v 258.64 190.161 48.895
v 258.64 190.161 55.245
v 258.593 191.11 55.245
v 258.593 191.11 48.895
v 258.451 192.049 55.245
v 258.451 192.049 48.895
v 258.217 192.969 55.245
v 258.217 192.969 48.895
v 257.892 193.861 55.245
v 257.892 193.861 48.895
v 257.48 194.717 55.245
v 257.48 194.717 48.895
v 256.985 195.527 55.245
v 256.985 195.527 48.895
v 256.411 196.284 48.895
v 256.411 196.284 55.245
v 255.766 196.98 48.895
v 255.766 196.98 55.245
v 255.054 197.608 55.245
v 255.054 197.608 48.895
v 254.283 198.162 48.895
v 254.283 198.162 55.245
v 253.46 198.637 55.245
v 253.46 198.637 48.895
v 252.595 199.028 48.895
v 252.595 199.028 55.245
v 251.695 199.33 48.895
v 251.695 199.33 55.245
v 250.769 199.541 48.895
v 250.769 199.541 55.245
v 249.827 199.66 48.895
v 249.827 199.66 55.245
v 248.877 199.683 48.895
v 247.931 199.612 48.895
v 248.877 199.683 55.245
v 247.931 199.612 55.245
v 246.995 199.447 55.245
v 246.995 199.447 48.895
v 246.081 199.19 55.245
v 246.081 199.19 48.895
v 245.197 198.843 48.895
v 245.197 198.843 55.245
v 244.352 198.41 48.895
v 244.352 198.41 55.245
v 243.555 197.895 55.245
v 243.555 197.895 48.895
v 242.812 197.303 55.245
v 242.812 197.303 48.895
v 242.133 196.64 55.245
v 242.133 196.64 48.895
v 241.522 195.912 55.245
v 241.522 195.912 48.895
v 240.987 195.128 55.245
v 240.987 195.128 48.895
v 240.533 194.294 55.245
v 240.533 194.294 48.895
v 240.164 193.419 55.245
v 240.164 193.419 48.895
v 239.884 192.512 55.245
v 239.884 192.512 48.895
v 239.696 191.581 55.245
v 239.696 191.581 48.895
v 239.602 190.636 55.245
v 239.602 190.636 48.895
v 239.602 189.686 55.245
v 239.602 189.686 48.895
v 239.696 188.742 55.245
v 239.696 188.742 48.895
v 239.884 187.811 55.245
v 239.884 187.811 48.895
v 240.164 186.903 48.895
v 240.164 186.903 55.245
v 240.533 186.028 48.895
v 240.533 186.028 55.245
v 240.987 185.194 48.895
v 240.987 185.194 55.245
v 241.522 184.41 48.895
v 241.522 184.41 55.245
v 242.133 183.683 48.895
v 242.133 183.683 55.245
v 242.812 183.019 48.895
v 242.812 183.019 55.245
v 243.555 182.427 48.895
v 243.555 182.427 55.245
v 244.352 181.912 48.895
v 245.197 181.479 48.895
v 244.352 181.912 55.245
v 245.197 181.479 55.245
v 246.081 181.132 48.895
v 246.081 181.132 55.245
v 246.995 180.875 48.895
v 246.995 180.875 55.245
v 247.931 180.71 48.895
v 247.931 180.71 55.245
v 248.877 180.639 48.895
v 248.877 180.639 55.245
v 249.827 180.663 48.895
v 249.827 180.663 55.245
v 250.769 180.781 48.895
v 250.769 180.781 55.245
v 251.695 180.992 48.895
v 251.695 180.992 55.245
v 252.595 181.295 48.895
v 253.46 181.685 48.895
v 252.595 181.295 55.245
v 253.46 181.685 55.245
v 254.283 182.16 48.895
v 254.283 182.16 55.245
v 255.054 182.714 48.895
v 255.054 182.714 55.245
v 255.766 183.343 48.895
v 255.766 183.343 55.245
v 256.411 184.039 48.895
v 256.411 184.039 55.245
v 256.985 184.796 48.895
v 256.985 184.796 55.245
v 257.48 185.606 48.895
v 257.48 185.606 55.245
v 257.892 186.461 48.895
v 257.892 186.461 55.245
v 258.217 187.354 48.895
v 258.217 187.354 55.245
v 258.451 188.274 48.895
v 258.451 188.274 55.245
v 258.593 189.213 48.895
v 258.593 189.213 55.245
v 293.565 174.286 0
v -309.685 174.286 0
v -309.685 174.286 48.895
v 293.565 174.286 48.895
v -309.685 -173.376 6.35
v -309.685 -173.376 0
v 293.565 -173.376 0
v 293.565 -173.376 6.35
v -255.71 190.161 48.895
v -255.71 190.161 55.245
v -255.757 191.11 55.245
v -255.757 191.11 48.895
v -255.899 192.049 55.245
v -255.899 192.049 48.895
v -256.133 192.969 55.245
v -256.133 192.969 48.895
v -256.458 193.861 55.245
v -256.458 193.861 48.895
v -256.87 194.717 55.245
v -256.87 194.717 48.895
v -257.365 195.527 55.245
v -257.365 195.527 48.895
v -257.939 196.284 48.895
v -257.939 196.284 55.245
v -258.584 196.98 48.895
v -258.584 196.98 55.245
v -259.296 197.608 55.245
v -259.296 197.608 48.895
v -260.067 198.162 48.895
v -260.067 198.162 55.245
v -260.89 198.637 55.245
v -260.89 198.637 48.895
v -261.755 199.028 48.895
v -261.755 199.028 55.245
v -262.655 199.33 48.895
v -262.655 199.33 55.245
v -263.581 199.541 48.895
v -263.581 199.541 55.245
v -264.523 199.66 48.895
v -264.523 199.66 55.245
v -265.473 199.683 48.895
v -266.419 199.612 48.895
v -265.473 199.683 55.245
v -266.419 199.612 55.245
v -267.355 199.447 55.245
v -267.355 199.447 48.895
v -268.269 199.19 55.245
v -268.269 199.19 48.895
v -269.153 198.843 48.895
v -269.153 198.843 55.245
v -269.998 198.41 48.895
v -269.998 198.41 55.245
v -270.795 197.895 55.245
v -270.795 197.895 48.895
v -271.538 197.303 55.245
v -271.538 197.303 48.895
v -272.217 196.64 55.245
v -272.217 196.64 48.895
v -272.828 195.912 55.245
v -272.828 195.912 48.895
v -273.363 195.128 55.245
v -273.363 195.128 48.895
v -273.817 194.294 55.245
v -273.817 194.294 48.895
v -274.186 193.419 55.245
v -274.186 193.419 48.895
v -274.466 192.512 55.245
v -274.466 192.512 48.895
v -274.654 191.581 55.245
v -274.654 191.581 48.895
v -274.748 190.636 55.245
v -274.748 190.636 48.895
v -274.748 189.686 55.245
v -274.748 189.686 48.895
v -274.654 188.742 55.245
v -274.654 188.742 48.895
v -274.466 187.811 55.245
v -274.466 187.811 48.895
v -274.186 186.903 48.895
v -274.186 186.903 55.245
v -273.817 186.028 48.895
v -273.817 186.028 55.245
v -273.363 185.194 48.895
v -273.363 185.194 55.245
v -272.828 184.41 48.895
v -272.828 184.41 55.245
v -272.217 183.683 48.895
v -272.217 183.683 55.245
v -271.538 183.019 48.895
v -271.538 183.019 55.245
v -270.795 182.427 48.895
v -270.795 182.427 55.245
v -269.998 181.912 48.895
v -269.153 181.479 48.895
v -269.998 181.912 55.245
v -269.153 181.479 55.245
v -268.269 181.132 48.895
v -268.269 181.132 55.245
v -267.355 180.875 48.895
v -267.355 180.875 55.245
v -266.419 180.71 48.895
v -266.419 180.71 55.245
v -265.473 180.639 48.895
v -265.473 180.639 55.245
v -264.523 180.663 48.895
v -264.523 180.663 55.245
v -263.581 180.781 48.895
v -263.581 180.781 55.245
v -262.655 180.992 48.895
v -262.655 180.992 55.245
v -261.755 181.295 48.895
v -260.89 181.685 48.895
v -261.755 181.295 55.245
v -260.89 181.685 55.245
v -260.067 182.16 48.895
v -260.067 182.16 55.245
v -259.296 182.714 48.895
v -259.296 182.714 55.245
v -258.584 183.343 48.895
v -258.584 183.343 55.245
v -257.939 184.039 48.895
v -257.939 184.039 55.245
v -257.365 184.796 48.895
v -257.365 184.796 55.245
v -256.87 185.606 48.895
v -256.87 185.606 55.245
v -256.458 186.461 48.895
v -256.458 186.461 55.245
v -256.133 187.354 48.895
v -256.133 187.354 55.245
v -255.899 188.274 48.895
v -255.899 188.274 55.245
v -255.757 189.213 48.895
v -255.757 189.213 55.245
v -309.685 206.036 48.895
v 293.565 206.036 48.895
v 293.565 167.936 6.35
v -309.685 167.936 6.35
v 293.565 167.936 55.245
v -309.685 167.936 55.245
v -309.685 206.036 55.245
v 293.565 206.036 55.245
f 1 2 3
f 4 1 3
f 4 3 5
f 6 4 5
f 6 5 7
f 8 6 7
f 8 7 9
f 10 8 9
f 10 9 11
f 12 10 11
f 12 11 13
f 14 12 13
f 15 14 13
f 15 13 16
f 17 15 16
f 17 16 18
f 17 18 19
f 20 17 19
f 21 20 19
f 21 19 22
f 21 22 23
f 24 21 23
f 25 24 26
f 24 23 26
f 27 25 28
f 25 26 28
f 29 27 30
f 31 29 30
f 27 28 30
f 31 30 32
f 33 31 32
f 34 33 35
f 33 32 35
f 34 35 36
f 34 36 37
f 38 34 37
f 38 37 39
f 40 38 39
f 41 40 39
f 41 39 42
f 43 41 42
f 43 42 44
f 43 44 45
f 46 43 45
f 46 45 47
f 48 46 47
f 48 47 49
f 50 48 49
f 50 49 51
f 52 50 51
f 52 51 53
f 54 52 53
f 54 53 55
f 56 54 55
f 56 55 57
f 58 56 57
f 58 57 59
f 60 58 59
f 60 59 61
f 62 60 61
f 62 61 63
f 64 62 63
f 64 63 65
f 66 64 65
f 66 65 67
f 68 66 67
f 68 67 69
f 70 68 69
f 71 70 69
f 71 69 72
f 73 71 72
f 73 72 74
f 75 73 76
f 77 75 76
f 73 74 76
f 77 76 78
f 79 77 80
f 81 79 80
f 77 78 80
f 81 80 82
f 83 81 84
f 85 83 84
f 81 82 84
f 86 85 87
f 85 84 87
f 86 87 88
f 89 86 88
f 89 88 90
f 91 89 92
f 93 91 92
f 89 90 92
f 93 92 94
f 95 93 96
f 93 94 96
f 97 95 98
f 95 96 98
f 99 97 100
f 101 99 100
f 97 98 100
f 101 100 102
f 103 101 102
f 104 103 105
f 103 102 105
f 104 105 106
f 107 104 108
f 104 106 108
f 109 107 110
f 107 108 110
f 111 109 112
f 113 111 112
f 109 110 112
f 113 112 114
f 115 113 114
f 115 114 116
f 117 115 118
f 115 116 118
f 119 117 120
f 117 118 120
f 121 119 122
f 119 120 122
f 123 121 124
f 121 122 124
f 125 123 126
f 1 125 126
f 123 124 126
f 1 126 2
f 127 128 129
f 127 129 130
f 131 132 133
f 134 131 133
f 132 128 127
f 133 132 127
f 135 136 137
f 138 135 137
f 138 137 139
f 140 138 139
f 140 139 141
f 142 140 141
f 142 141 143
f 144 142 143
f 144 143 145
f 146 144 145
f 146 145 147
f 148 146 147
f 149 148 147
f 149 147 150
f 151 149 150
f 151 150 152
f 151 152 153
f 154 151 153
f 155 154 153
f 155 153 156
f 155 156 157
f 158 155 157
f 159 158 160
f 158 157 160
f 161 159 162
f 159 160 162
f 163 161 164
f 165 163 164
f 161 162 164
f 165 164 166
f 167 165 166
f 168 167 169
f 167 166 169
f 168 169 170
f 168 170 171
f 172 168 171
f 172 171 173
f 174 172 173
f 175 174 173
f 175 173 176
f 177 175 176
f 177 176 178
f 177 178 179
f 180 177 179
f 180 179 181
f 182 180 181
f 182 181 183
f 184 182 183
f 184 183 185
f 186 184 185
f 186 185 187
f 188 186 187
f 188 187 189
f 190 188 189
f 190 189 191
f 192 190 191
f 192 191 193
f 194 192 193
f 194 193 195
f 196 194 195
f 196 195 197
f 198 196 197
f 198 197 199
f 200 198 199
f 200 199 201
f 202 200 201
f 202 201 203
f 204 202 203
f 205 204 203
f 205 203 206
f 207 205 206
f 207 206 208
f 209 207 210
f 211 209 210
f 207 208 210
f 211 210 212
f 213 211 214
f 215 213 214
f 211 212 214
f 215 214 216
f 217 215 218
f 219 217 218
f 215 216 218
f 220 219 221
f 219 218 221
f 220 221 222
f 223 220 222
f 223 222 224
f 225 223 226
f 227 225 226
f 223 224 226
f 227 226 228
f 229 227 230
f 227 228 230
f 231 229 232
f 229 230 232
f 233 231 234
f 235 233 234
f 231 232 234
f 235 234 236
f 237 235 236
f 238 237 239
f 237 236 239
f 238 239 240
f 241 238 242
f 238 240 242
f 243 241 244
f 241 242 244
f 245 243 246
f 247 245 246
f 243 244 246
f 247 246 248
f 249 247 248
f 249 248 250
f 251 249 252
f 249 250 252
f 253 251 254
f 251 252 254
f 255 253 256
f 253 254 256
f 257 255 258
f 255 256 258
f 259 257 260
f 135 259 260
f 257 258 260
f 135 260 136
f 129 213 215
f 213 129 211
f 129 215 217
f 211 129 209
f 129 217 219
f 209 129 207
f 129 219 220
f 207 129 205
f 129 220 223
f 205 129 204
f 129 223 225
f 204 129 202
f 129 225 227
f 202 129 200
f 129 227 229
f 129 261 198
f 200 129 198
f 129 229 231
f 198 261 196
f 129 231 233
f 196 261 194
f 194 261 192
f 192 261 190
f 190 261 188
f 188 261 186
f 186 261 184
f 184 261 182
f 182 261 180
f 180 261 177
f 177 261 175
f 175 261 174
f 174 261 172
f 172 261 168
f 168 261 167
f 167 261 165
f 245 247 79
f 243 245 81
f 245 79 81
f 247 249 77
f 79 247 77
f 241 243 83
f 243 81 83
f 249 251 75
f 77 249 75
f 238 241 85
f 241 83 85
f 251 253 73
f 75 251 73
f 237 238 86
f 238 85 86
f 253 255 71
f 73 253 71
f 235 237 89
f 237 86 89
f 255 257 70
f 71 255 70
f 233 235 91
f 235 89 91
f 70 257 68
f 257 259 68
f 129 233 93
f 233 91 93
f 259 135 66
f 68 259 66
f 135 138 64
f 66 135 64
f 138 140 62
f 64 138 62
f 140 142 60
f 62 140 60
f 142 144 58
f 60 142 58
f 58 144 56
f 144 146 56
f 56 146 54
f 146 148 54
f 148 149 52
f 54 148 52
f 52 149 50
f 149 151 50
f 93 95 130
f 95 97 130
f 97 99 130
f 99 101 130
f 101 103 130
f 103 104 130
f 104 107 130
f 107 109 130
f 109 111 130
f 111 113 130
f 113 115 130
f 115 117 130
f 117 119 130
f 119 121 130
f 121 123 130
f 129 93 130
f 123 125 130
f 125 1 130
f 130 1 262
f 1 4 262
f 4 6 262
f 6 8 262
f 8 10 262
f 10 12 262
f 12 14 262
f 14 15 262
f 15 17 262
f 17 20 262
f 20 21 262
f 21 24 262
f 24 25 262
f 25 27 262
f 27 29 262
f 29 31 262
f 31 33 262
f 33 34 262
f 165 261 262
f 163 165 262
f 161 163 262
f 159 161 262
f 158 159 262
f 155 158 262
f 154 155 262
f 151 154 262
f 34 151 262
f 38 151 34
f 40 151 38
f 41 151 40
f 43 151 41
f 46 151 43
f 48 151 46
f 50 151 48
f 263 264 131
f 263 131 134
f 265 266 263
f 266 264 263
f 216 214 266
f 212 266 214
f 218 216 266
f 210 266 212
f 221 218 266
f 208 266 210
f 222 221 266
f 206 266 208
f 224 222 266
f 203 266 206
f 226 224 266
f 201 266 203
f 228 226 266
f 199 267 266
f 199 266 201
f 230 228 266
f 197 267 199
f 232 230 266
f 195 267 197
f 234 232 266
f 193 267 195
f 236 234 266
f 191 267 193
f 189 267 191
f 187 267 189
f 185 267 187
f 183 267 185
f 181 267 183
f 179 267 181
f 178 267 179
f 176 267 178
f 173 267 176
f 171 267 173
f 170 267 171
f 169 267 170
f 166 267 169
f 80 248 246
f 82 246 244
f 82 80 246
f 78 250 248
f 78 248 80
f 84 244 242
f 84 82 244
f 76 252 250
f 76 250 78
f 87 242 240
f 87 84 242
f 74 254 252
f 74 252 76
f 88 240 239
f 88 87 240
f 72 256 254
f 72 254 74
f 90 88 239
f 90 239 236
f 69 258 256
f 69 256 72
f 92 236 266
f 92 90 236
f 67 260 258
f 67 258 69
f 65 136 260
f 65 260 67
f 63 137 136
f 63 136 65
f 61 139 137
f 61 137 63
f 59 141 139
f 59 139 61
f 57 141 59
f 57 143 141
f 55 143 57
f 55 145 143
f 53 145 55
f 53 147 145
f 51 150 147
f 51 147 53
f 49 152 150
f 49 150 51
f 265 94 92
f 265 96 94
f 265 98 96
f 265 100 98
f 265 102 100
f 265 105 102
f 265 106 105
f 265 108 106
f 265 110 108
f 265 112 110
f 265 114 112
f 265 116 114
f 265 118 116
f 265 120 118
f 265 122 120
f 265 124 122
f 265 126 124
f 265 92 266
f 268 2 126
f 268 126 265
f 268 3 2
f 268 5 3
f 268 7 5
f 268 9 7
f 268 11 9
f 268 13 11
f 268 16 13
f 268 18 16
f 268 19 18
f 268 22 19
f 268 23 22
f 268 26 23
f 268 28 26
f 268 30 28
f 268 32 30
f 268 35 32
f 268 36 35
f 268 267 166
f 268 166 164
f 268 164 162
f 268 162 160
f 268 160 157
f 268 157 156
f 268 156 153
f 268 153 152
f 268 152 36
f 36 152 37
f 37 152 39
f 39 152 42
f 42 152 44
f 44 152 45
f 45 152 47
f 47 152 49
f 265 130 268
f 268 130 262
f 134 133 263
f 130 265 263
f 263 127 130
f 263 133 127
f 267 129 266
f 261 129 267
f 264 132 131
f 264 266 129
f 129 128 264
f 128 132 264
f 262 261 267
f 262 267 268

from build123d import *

# Parameters (mm, degrees)
F0_W     = 603.25
F0_H     = 347.6625
F1_DEPTH = 6.35
F2_W     = 603.25
F2_H     = 6.35
F3_DEPTH = 42.545
F4_W     = 603.25
F4_H     = 38.1
F5_DEPTH = 6.35
F6_R     = 9.525
F7_DEPTH = 55.246


with BuildPart() as f1:
    # F0 (on Top) → F1 (new body)
    with BuildSketch(Plane.XY):
        with Locations((-8.060125, 0.454914)):
            Rectangle(F0_W, F0_H)
    extrude(amount=F1_DEPTH)

    # F2 (on face) → F3 (join)
    with BuildSketch(Plane.XY.offset(6.35)):
        with Locations((-8.060125, 171.111164)):
            Rectangle(F2_W, F2_H)
    extrude(amount=F3_DEPTH)

    # F4 (on face) → F5 (join)
    with BuildSketch(Plane.XY.offset(48.895)):
        with Locations((-8.060125, 186.986164)):
            Rectangle(F4_W, F4_H)
    extrude(amount=F5_DEPTH)

    # F6 (on face) → F7 (cut, through all)
    with BuildSketch(Plane.XY.offset(55.245)):
        with Locations((-265.235125, 190.161164)):
            Circle(F6_R)
        with Locations((249.114875, 190.161164)):
            Circle(F6_R)
    extrude(amount=-F7_DEPTH, mode=Mode.SUBTRACT)


solid = f1.part
